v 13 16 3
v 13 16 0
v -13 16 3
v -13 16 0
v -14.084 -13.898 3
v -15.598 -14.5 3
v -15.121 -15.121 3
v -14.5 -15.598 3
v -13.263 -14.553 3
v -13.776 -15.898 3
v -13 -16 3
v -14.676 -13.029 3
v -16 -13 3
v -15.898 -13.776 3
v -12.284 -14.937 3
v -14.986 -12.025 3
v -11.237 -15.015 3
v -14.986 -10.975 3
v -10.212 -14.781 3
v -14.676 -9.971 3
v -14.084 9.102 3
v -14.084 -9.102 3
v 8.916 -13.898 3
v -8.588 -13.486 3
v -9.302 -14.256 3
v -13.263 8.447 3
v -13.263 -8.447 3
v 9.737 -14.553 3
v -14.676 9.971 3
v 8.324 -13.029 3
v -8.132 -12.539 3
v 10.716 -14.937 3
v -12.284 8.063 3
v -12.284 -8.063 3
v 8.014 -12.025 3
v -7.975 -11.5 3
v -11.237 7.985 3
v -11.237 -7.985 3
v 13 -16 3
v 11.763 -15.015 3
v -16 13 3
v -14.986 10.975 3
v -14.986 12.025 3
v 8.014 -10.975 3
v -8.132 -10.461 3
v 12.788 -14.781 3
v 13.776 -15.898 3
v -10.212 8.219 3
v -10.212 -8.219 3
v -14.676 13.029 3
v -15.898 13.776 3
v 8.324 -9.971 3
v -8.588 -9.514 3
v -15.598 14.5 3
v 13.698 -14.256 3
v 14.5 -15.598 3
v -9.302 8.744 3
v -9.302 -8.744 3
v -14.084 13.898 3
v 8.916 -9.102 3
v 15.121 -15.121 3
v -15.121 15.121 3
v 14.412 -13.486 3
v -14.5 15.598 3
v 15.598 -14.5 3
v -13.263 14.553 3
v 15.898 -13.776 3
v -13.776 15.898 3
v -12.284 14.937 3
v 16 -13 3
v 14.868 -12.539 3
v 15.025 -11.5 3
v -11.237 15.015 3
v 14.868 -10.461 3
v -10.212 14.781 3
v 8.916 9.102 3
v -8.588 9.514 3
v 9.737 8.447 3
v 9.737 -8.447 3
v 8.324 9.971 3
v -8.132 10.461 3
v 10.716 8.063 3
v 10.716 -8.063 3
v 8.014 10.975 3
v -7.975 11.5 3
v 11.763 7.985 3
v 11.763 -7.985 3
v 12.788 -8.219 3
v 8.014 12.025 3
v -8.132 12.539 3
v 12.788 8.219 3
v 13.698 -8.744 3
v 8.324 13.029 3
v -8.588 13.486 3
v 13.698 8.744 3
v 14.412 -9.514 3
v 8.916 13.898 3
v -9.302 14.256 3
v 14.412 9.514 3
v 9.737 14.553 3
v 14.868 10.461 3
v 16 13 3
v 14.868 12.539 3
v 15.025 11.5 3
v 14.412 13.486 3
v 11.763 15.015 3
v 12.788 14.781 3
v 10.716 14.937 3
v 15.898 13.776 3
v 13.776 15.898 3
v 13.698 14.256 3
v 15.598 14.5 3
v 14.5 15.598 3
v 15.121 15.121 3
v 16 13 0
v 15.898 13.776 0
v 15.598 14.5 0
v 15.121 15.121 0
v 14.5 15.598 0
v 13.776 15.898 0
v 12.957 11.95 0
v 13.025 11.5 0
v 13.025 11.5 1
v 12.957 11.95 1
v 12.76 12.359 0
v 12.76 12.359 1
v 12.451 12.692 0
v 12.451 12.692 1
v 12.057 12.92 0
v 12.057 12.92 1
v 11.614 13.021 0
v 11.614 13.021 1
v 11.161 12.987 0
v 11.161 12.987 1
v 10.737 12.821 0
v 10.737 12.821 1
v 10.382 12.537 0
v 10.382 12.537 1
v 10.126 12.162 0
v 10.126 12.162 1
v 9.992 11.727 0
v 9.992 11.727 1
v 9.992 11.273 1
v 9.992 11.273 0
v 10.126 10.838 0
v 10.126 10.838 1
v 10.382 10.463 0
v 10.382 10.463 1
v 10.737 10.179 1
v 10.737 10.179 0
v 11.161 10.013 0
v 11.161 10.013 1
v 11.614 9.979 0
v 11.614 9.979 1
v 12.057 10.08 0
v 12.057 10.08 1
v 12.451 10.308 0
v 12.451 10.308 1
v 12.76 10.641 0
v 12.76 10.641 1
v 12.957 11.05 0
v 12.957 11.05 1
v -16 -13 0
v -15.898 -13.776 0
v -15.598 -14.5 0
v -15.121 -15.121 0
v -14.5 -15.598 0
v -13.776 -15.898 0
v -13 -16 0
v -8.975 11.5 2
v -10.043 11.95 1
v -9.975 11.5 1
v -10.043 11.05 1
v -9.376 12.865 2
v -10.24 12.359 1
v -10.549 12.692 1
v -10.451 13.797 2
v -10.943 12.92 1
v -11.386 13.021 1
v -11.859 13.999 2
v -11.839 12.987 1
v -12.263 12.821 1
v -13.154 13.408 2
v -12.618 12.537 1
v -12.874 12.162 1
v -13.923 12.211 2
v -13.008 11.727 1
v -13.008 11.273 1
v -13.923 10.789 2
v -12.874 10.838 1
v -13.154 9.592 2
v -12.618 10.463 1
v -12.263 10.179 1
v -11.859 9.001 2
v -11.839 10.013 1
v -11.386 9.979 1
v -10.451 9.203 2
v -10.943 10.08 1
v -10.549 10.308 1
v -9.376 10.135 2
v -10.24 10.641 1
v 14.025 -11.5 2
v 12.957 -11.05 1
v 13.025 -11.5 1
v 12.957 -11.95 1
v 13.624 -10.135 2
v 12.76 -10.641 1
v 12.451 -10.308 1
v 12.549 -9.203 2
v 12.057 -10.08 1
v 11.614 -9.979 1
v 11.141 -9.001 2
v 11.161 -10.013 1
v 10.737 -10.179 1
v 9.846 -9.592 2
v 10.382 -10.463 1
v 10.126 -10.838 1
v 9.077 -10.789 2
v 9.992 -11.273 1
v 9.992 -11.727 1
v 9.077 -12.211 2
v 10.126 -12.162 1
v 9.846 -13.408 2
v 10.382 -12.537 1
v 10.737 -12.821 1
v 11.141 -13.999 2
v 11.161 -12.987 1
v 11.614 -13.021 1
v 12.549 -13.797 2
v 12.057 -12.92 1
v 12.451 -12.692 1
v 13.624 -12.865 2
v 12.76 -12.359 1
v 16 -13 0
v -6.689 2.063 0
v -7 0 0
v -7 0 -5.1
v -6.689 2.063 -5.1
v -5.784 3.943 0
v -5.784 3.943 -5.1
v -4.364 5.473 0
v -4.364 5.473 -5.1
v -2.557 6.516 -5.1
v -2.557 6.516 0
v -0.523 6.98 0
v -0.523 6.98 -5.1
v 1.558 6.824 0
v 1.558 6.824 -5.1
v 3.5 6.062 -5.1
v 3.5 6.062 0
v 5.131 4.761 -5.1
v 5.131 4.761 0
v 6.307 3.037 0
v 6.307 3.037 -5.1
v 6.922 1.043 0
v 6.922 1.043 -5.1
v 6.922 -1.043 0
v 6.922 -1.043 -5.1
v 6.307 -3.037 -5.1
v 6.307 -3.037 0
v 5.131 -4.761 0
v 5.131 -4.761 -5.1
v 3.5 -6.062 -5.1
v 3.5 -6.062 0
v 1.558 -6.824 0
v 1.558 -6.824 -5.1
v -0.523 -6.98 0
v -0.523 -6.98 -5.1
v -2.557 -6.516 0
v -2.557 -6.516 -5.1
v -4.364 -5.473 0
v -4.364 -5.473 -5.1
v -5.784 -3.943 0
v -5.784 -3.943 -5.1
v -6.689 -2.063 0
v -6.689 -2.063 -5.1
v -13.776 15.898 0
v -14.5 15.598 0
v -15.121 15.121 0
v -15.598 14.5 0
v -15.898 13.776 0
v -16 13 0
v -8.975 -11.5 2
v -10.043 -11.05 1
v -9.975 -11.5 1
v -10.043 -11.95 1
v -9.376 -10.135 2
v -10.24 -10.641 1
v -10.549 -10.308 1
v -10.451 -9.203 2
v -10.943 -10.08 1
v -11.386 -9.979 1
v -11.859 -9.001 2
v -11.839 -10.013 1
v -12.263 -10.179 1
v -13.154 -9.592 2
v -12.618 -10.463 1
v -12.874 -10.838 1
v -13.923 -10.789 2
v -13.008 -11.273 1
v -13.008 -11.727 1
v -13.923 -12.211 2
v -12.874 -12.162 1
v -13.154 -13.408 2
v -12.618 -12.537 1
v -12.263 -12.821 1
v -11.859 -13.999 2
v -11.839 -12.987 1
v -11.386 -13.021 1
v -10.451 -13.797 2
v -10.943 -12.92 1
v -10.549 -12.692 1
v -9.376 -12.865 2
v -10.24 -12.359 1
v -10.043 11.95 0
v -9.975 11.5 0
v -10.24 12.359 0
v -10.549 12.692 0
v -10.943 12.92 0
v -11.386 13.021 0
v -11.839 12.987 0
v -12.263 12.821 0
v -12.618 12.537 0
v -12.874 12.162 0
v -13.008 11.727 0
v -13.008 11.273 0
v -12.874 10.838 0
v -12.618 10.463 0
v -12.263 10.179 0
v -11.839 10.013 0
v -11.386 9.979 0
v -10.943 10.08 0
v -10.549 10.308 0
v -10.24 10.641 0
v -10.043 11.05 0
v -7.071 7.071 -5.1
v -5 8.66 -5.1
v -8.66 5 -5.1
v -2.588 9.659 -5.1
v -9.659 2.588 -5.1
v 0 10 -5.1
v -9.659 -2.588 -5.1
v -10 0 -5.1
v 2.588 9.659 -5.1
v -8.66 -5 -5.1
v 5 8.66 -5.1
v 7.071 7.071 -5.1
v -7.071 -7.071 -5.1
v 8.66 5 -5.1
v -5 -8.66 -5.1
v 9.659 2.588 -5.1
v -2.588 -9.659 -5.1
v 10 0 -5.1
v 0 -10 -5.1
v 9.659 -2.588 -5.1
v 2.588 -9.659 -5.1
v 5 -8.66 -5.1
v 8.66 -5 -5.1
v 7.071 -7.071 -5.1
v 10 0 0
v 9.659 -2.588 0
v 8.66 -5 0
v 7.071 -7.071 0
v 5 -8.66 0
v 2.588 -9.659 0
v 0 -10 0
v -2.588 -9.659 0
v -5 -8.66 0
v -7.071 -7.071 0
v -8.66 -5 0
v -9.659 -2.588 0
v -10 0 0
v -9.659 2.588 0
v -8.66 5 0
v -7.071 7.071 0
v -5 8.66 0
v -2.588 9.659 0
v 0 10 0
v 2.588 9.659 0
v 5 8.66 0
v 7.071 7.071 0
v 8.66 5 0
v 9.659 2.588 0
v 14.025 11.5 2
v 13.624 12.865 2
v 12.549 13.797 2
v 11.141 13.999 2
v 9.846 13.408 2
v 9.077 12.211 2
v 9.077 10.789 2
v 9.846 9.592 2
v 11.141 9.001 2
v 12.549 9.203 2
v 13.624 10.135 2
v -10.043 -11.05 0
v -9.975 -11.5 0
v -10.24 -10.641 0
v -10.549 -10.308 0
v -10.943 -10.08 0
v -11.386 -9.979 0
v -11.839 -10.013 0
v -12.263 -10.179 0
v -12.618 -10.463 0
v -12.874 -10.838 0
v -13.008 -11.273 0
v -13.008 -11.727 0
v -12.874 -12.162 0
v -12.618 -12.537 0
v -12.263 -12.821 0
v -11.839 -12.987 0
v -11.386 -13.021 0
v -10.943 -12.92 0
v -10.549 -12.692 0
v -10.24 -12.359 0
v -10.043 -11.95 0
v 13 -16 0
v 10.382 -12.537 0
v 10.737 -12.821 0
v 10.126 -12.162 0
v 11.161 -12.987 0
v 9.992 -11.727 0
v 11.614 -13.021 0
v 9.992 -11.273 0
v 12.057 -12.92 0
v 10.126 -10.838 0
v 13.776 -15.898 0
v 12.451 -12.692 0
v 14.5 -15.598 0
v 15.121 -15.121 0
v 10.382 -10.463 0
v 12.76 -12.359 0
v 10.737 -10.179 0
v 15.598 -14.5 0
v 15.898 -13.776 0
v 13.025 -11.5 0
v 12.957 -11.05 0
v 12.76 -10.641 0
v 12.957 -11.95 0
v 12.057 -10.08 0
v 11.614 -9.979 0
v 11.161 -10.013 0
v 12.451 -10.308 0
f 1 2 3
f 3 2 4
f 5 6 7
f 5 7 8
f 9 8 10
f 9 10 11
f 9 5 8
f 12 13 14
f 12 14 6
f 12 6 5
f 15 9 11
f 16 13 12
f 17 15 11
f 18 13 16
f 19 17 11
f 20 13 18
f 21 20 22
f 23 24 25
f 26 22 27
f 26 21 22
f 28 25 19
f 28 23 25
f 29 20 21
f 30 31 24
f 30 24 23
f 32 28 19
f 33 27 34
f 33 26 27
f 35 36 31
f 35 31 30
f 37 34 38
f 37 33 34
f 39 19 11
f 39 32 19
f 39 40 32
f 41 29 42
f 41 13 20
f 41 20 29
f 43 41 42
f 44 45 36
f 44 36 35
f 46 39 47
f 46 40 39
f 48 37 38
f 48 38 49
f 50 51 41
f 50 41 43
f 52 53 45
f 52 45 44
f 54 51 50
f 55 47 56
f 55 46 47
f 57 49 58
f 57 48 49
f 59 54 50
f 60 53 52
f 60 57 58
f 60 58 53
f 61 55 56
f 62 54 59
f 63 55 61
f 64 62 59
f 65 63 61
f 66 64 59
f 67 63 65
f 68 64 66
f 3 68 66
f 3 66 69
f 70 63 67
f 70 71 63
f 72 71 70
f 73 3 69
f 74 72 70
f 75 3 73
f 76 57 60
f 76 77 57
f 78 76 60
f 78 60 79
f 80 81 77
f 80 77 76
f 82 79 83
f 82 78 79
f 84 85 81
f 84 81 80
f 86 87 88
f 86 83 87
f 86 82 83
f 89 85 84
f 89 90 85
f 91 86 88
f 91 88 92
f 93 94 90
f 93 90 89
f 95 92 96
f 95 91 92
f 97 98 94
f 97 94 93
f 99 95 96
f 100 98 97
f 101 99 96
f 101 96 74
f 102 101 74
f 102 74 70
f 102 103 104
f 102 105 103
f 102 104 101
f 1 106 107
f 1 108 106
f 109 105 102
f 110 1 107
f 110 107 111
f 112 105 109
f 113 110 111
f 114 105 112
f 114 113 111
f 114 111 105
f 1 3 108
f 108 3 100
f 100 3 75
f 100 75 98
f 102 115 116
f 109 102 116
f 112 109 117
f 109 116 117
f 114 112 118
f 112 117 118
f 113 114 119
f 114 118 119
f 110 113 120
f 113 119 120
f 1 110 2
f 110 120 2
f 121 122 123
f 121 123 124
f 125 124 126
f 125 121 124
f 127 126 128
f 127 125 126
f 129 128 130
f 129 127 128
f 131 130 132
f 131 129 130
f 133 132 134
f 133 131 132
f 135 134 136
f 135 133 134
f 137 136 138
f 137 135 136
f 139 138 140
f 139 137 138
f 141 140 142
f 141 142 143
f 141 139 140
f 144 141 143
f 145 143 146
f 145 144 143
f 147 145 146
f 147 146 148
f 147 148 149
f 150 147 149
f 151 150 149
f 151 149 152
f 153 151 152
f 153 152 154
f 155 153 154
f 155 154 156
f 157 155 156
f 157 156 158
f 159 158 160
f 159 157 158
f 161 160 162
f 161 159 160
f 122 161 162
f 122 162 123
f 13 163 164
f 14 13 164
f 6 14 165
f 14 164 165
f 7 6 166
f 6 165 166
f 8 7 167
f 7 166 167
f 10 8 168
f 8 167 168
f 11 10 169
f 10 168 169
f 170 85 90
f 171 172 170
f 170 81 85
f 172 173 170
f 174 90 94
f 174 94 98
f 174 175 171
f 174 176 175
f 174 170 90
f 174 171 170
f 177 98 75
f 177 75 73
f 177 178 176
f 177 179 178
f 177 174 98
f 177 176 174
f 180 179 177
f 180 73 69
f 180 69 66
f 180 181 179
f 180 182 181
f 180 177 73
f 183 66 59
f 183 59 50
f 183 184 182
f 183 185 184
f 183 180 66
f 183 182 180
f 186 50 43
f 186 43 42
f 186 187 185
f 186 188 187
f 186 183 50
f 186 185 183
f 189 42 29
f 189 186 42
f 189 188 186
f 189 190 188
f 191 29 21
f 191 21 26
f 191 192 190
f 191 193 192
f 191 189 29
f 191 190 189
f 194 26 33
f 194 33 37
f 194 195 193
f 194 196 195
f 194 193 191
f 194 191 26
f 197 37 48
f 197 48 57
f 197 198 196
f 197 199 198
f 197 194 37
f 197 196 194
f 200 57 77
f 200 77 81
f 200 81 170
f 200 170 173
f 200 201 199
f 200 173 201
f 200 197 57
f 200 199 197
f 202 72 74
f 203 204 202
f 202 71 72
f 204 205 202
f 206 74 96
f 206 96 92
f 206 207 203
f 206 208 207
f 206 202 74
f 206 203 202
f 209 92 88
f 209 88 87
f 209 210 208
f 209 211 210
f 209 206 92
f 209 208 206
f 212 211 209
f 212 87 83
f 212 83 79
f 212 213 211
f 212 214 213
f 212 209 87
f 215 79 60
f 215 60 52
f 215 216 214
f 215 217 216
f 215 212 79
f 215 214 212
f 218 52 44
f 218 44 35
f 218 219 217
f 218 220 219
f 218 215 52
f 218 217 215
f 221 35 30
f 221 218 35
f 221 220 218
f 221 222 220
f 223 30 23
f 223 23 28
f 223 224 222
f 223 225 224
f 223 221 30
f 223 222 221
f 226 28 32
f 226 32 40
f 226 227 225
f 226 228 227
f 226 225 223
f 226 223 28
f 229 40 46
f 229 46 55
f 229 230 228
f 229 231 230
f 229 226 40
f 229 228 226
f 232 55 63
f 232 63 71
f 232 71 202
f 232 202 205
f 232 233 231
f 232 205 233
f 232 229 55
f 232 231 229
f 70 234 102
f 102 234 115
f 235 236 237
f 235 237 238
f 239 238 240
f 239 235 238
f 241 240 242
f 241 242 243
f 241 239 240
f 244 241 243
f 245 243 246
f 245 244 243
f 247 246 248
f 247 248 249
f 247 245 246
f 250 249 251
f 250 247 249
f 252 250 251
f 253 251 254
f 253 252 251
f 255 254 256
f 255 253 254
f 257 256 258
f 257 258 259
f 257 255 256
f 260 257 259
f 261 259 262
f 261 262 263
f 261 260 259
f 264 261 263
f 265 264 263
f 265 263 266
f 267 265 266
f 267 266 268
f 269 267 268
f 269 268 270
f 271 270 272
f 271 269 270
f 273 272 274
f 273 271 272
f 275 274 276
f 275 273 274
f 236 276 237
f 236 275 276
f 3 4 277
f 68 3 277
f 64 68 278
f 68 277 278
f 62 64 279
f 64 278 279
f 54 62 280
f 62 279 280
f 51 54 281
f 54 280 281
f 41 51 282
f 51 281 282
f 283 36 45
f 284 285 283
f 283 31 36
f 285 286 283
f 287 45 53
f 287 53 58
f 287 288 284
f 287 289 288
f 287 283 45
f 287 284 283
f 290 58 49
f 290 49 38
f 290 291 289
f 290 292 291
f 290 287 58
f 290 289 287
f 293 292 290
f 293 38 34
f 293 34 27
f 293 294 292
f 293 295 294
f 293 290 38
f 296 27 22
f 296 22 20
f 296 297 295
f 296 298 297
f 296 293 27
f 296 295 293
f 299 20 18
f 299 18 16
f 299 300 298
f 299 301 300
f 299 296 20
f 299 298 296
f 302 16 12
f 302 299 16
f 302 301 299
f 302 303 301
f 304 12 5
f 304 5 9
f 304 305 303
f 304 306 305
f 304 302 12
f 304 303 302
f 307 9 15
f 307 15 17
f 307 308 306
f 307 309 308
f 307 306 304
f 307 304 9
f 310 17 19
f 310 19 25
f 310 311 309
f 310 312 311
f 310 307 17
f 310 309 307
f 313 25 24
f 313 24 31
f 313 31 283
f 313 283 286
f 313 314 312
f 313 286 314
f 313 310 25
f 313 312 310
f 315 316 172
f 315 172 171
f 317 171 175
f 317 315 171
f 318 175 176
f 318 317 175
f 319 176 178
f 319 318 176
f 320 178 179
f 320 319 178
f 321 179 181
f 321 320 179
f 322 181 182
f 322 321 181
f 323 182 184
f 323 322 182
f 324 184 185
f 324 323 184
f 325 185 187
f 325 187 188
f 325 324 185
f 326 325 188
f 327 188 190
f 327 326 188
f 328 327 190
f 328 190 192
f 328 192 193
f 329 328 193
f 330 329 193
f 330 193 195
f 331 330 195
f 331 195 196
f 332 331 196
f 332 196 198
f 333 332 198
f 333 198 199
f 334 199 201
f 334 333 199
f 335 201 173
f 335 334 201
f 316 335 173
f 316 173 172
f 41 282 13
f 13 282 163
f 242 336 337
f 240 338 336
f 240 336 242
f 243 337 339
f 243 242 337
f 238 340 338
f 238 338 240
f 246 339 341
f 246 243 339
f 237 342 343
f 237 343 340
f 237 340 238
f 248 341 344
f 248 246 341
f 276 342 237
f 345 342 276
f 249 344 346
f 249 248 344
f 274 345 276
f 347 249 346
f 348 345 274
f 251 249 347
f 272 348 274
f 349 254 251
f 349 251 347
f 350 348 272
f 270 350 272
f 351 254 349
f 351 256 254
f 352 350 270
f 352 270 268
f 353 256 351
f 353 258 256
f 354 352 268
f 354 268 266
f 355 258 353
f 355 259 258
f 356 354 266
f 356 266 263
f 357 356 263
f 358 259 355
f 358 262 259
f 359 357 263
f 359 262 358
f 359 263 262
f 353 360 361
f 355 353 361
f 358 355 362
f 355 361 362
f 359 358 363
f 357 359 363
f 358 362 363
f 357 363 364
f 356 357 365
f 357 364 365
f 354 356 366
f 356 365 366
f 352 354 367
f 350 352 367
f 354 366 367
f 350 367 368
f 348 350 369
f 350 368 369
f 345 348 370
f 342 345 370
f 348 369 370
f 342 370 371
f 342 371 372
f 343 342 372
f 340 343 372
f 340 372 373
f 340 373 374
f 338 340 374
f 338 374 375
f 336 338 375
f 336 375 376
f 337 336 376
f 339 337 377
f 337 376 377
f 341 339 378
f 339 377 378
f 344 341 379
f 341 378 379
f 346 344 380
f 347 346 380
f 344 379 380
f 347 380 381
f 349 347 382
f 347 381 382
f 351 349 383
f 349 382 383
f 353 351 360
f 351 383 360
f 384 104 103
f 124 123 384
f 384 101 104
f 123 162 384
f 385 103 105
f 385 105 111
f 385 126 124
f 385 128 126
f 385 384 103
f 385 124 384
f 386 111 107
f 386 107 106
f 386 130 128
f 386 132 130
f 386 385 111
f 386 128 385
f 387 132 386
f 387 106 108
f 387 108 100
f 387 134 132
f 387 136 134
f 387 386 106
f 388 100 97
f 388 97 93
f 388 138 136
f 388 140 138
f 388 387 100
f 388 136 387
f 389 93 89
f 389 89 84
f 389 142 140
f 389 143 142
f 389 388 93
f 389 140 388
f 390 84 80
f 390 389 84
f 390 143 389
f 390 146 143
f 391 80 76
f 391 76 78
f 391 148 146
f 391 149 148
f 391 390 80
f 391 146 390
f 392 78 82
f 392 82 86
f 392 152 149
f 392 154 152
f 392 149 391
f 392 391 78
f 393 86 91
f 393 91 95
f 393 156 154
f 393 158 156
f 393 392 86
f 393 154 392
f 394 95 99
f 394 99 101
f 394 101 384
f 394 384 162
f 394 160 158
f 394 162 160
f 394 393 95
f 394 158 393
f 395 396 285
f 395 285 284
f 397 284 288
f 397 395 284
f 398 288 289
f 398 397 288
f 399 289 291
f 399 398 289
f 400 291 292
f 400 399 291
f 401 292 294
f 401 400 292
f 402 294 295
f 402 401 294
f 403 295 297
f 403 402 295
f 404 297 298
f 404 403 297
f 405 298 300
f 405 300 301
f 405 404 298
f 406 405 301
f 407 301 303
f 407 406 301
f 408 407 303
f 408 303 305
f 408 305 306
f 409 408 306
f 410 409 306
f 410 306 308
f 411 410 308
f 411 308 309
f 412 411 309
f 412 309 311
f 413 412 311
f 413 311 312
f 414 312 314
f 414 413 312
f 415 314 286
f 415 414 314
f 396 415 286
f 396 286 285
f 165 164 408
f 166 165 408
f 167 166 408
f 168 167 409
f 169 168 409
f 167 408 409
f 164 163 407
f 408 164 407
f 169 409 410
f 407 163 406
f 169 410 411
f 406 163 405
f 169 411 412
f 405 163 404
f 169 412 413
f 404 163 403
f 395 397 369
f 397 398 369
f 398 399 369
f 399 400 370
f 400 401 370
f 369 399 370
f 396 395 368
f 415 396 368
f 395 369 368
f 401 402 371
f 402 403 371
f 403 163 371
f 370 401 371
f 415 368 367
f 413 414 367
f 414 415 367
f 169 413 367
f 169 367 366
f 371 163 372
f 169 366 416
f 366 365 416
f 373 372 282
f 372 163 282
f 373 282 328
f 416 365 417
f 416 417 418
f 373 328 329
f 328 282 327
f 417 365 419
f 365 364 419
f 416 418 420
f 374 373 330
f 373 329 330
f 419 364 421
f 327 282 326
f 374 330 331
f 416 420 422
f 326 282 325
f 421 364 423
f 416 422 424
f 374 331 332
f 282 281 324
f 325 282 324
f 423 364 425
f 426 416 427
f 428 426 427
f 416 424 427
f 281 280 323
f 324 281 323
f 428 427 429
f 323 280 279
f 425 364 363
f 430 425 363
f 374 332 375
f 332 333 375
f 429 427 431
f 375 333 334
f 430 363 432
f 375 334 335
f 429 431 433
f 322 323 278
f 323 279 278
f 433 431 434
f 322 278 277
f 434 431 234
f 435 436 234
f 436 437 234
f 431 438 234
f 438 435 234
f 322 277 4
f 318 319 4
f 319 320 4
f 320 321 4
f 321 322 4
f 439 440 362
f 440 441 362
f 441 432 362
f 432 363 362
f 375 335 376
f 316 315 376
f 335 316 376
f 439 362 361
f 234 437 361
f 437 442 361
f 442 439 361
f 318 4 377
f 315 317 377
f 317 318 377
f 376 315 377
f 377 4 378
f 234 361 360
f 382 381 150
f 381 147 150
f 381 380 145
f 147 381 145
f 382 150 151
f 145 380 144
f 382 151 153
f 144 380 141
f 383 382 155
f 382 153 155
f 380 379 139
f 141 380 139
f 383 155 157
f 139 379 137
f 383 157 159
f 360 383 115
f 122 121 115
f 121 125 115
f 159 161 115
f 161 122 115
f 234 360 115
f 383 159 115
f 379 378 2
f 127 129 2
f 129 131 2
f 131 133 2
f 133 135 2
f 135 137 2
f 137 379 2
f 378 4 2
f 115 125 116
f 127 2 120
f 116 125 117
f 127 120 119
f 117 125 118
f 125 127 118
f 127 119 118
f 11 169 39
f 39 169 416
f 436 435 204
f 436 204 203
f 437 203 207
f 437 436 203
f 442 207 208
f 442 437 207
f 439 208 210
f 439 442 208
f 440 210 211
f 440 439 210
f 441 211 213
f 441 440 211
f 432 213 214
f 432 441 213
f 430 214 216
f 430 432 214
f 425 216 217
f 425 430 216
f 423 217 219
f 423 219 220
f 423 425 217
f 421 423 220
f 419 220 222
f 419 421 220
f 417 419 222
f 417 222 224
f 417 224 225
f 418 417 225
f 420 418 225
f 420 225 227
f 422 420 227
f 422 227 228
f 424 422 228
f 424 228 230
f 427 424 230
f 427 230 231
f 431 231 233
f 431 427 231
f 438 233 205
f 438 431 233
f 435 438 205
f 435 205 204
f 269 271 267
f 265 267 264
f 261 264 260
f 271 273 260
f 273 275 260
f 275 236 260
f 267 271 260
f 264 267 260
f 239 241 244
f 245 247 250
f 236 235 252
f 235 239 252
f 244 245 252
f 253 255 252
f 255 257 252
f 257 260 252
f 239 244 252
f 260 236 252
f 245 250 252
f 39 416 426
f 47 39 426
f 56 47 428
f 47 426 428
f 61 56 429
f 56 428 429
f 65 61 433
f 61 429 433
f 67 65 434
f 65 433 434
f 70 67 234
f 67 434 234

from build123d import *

# Parameters (mm, degrees)
SKETCH_1_R      = 1.525
EXTRUDE_1_DEPTH = 3
SKETCH_2_R      = 10
SKETCH_2_R_2    = 7
EXTRUDE_2_DEPTH = 5.1
CHAMFER_1_SIZE  = 2


with BuildPart() as part:
    # Эскиз1 → Бобышка-Вытянуть1 (new body)
    with BuildSketch(Plane.XY):
        with BuildLine():
            Line((13, 16), (-13, 16))
            ThreePointArc((-13, 16), (-15.121320344, 15.121320344), (-16, 13))
            Line((-16, 13), (-16, -13))
            ThreePointArc((-16, -13), (-15.121320344, -15.121320344), (-13, -16))
            Line((-13, -16), (13, -16))
            ThreePointArc((13, -16), (15.121320344, -15.121320344), (16, -13))
            Line((16, -13), (16, 13))
            ThreePointArc((16, 13), (15.121320344, 15.121320344), (13, 16))
        make_face()
        with Locations((-11.5, -11.5)):
            Circle(SKETCH_1_R, mode=Mode.SUBTRACT)
        with Locations((-11.5, 11.5)):
            Circle(SKETCH_1_R, mode=Mode.SUBTRACT)
        with Locations((11.5, -11.5)):
            Circle(SKETCH_1_R, mode=Mode.SUBTRACT)
        with Locations((11.5, 11.5)):
            Circle(SKETCH_1_R, mode=Mode.SUBTRACT)
    extrude(amount=EXTRUDE_1_DEPTH)

    # Эскиз2 → Бобышка-Вытянуть2 (add)
    with BuildSketch(Plane(origin=(0, 0, 0), x_dir=(-1, 0, 0), z_dir=(0, 0, -1))):
        with Locations(Location((0, 0, 0), (0, 0, 180))):
            Circle(SKETCH_2_R)
        Circle(SKETCH_2_R_2, mode=Mode.SUBTRACT)
    extrude(amount=EXTRUDE_2_DEPTH)

    # Фаска1
    chamfer_1_edges = [part.edges().sort_by_distance(p)[0] for p in [
        (-13.025, -11.5, 3),
        (9.975, -11.5, 3),
        (9.975, 11.5, 3),
        (-13.025, 11.5, 3),
    ]]
    chamfer(chamfer_1_edges, length=CHAMFER_1_SIZE)


solid = part.part
